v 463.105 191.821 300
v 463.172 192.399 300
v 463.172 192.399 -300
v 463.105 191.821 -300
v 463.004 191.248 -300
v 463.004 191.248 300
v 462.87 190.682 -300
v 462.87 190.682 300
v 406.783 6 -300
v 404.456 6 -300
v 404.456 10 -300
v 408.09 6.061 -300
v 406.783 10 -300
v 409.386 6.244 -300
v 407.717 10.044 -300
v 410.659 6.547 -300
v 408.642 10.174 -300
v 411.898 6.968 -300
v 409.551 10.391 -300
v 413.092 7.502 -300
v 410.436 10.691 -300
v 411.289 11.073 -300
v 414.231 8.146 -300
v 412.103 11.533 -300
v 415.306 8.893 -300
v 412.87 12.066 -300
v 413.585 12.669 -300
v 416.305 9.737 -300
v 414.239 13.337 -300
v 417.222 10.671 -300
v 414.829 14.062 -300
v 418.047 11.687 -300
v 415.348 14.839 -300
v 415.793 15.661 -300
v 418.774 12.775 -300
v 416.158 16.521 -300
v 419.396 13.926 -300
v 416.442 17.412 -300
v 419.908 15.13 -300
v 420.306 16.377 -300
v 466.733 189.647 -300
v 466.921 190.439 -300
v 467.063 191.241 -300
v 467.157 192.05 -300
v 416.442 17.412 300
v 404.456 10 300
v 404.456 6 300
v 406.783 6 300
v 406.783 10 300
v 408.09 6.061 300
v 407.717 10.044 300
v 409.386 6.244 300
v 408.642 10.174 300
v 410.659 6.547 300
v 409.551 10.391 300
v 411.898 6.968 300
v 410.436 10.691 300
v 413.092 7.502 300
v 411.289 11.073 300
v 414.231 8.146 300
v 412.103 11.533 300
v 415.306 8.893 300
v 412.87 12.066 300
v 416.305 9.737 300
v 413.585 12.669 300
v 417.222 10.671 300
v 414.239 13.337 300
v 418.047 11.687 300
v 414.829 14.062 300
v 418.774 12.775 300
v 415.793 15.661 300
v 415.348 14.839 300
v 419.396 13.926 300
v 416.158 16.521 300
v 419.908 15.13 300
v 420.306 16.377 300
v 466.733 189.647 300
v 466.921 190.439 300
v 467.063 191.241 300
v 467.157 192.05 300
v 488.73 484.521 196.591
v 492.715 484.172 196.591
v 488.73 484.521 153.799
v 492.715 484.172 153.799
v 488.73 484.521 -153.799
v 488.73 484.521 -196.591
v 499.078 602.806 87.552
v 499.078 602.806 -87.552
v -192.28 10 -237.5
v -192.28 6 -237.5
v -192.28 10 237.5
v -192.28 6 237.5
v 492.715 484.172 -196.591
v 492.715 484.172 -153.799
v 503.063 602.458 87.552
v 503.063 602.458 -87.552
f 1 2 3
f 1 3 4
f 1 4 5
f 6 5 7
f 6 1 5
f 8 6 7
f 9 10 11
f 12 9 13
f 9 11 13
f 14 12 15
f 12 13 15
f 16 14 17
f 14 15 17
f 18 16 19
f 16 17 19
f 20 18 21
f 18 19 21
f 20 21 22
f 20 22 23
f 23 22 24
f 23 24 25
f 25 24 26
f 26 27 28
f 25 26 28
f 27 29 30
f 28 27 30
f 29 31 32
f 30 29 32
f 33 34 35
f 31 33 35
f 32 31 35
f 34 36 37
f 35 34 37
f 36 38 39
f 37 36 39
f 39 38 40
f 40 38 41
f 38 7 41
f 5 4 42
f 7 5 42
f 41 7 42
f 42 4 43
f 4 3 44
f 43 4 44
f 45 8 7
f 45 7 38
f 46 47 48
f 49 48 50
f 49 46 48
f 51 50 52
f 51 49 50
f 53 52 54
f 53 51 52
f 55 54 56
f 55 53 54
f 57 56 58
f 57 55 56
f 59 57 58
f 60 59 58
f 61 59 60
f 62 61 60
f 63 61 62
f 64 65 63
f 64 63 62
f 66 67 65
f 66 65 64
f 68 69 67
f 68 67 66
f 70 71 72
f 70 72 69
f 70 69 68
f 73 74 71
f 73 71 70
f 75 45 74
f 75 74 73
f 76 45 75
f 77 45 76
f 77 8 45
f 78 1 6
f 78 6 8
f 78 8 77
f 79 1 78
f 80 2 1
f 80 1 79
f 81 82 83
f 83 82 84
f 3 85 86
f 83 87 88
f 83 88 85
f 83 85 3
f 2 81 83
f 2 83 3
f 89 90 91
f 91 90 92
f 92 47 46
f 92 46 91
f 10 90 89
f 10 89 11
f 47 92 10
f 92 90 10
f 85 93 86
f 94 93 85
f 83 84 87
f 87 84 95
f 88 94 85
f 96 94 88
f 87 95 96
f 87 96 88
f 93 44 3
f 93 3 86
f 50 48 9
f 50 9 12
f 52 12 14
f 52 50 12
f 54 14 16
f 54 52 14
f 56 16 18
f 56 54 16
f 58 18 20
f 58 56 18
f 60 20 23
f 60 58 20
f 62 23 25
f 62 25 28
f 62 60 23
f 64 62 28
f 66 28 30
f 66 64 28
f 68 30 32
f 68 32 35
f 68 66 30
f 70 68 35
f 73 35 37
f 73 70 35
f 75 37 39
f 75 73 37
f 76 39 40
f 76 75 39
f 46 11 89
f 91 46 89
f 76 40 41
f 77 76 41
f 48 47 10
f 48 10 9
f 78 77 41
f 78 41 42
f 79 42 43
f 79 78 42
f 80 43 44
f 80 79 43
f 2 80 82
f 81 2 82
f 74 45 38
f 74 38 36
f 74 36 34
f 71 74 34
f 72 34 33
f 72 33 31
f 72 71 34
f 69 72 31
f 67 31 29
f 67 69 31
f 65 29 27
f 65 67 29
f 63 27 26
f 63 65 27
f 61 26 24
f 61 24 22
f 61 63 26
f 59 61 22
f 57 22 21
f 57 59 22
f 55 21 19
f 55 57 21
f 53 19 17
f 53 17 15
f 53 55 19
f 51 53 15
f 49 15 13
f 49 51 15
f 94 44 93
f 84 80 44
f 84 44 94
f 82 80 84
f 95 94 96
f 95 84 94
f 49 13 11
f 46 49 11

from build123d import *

# Parameters (mm, degrees)
BOSS_EXTRUDE1_DEPTH          = 10
CONVERT_SOLID1_DEPTH         = 6
EDGE_FLANGE2_DEPTH           = 600
EDGE_FLANGE4_STRIP_CUT_DEPTH = 600
EDGE_FLANGE4_DEPTH           = 600
CUT_EXTRUDE2_DEPTH           = 952.374861111
CUT_EXTRUDE2_DEPTH_BACK      = 952.374861111


# Read off the part's stored shape, not the designer's step: Convert-Solid1
# Sheet-metal steps are written as plain solids
with BuildPart() as part:
    # Sketch1 → Boss-Extrude1 (new body)
    with BuildSketch(Plane(origin=(0, 0, 0), x_dir=(1, 0, 0), z_dir=(0, 1, 0))):
        Polygon((-192.279765905, 0), (-192.279765905, 237.5), (404.456147209, 300), (404.456147209, 0), (404.456147209, -300), (-192.279765905, -237.5), align=None)
    extrude(amount=BOSS_EXTRUDE1_DEPTH)

    # Convert-Solid1 outline → Convert-Solid1 (cut)
    with BuildSketch(Plane(origin=(0, 0, 0), x_dir=(1, 0, 0), z_dir=(0, 1, 0))):
        Polygon((-192.279765905, -237.5), (404.456147209, -300), (404.456147209, 300), (-192.279765905, 237.5), align=None)
    extrude(amount=CONVERT_SOLID1_DEPTH, mode=Mode.SUBTRACT)

    # Edge-Flange2 section (across the edge) → Edge-Flange2 (add)
    with BuildSketch(Plane(origin=(414.456147209, 10, 300), x_dir=(-0.9659258262890673, 0.25881904510252446, 0), z_dir=(0, 0, -1))):
        with BuildLine():
            Line((-4, 7.67326988), (-4, 187.930692048))
            Line((-4, 187.930692048), (0, 187.930692048))
            Line((0, 187.930692048), (0, 7.67326988))
            ThreePointArc((0, 7.67326988), (2.066466597, 1.58565559), (7.411809549, -1.985988383))
            Line((7.411809549, -1.985988383), (9.659258263, -2.588190451))
            Line((9.659258263, -2.588190451), (8.623982082, -6.451893756))
            Line((8.623982082, -6.451893756), (6.376533369, -5.849691688))
            ThreePointArc((6.376533369, -5.849691688), (-1.106946764, -0.849390126), (-4, 7.67326988))
        make_face()
    extrude(amount=EDGE_FLANGE2_DEPTH)

    # Edge-Flange4 strip (across the edge) → Edge-Flange4 strip cut (cut)
    with BuildSketch(Plane(origin=(463.09618947, 191.527109002, 300), x_dir=(-0.9961946980917449, 0.0871557427476667, 0), z_dir=(0, 0, -1))):
        Polygon((-10.038642938, 33.896891256), (-3.787308542, -1.556187852), (0.15192247, -0.861595141), (-6.099411926, 34.591483967), align=None)
    extrude(amount=EDGE_FLANGE4_STRIP_CUT_DEPTH, mode=Mode.SUBTRACT)

    # Edge-Flange4 section (across the edge) → Edge-Flange4 (add)
    with BuildSketch(Plane(origin=(463.09618947, 191.527109002, 300), x_dir=(-0.9961946980917449, 0.0871557427476667, 0), z_dir=(0, 0, -1))):
        with BuildLine():
            Line((-4, 0.874886635), (-4, 412.850045346))
            Line((-4, 412.850045346), (0, 412.850045346))
            Line((0, 412.850045346), (0, 0.874886635))
            ThreePointArc((0, 0.874886635), (0.038053019, 0.003329208), (0.15192247, -0.861595141))
            Line((0.15192247, -0.861595141), (-3.787308542, -1.556187852))
            ThreePointArc((-3.787308542, -1.556187852), (-3.946725773, -0.345293763), (-4, 0.874886635))
        make_face()
    extrude(amount=EDGE_FLANGE4_DEPTH)

    # Sketch22 → Cut-Extrude2 (cut, two sides: drawn at the far end of the back side and taken through both)
    with BuildSketch(Plane(origin=(442.9492869, -38.753041121, 0), x_dir=(0, 0, 1), z_dir=(-0.9961946980917449, 0.08715574274766662, 0)).offset(-CUT_EXTRUDE2_DEPTH_BACK)):
        Polygon((300, 232.03466952), (196.591479546, 525.272945681), (153.798650158, 525.272945681), (87.551647761, 644.009828231), (302.699803465, 645.121208779), (304.833664863, 232.03466952), align=None)
        Polygon((-300, 232.03466952), (-196.591479546, 525.272945681), (-153.798650158, 525.272945681), (-87.551647761, 644.009828231), (-302.699803465, 645.121208779), (-304.833664863, 232.03466952), align=None)
    extrude(amount=CUT_EXTRUDE2_DEPTH + CUT_EXTRUDE2_DEPTH_BACK, mode=Mode.SUBTRACT)


solid = part.part
